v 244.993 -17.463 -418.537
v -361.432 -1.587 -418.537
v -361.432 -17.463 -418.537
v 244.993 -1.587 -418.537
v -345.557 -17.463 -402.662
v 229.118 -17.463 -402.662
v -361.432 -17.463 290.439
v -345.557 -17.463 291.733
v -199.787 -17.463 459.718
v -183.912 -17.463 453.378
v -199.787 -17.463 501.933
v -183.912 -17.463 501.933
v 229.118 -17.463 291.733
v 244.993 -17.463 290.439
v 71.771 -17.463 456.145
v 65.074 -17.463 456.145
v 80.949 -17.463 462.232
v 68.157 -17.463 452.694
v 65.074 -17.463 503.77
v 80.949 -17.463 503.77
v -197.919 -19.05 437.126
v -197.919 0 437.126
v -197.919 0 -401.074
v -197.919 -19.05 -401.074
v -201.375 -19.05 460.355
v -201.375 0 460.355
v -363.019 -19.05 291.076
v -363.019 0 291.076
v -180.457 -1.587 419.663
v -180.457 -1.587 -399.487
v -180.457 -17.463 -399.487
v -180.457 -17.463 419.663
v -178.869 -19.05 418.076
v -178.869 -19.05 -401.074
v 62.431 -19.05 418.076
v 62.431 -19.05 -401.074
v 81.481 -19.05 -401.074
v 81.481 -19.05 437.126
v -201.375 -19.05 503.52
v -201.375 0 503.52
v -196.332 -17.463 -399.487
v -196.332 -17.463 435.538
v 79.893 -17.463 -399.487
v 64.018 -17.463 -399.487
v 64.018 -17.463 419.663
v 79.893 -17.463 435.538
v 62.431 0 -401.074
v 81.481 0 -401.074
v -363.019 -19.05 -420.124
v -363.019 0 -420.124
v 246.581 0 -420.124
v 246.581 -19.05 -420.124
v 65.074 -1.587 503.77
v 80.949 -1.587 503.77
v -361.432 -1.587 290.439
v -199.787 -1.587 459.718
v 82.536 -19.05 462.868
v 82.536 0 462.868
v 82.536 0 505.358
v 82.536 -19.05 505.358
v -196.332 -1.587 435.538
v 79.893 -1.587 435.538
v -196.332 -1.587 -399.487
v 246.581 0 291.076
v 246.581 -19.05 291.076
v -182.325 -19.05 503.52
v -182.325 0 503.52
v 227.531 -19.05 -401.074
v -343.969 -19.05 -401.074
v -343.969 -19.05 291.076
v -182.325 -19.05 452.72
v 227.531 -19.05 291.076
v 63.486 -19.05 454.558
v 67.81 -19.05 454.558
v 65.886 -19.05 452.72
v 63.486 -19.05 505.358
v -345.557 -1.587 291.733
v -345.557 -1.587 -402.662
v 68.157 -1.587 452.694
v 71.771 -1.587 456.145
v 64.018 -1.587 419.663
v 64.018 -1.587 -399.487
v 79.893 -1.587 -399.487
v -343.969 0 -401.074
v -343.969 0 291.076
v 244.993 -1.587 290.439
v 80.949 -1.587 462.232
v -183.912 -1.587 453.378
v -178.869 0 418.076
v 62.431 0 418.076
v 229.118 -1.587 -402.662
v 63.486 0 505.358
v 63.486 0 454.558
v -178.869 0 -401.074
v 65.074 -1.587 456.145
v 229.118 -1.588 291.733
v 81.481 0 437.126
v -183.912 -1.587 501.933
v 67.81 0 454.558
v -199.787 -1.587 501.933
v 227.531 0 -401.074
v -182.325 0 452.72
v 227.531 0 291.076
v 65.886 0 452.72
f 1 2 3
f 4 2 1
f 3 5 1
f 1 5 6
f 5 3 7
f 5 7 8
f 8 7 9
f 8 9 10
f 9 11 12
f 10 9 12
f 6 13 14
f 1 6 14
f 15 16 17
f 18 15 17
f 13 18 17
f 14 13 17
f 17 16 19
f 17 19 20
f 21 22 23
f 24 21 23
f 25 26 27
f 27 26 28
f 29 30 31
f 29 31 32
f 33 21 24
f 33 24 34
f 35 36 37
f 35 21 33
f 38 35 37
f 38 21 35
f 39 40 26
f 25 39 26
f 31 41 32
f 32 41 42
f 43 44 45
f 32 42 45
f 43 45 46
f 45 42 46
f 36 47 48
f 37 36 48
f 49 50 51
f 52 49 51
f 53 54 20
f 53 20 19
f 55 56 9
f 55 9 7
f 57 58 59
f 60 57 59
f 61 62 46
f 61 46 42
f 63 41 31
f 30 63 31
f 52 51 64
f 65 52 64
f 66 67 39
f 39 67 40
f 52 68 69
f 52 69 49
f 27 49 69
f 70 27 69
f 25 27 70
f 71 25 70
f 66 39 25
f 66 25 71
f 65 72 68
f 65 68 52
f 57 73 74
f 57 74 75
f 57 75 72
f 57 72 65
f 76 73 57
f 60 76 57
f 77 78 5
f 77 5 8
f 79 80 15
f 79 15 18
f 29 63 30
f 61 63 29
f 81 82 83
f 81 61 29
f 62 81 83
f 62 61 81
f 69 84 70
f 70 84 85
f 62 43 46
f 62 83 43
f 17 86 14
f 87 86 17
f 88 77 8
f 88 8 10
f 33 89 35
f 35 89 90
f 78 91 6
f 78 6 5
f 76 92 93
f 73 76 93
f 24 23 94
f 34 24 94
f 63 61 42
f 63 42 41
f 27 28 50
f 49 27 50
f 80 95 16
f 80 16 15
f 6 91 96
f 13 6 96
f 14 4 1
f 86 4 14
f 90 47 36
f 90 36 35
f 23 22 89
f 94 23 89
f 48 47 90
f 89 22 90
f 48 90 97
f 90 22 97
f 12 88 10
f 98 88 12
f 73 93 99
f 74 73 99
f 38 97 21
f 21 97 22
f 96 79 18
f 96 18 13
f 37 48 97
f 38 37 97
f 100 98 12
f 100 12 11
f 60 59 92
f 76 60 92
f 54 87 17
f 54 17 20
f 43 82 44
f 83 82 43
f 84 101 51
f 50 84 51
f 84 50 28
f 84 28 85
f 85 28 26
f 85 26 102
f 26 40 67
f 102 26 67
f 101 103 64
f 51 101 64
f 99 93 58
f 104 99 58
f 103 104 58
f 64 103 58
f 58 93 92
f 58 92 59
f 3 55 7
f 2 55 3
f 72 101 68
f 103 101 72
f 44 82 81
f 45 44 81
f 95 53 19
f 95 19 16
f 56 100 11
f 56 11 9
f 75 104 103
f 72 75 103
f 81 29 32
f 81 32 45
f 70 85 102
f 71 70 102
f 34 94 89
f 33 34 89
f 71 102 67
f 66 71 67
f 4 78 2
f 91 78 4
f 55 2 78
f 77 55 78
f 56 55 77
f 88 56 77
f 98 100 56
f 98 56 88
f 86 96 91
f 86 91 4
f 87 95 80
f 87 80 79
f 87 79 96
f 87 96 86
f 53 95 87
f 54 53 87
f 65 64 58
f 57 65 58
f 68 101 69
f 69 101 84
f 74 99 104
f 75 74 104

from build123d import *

# Parameters (mm, degrees)
F0_W     = 19.05
F0_H     = 692.15
F1_DEPTH = 19.05
F2_W     = 19.05
F2_H     = 819.15
F3_DEPTH = 19.05
F4_T     = -1.5875


with BuildPart() as f1:
    # F0 (on Front) → F1 (new body)
    with BuildSketch(Plane.XZ):
        Polygon((-201.3746880207, 460.3546897234), (-363.0192981999, 291.0755020554), (-343.9692981999, 291.0755020554), (-182.3246880207, 452.7201122347), (-201.3746880207, 452.7201122347), align=None)
        Polygon((-343.9692981999, 291.0755020554), (-363.0192981999, 291.0755020554), (-363.0192981999, -420.1244979446), (-343.9692981999, -420.1244979446), (-343.9692981999, -401.0744979446), align=None)
        Polygon((-201.3746880207, 503.5201122347), (-201.3746880207, 460.3546897234), (-196.1021746691, 465.8762272256), (-182.3246880207, 452.7201122347), (-182.3246880207, 503.5201122347), align=None)
        Polygon((-196.1021746691, 465.8762272256), (-201.3746880207, 460.3546897234), (-201.3746880207, 452.7201122347), (-182.3246880207, 452.7201122347), align=None)
        Polygon((227.5307018001, -401.0744979446), (-343.9692981999, -401.0744979446), (-343.9692981999, -420.1244979446), (246.5807018001, -420.1244979446), (246.5807018001, -401.0744979446), align=None)
        with Locations((237.0557018001, -54.9994979446)):
            Rectangle(F0_W, F0_H)
        Polygon((65.8860916208, 452.7201122347), (227.5307018001, 291.0755020554), (246.5807018001, 291.0755020554), (82.5360768914, 462.8680586711), (82.5360768914, 454.5575380325), (67.8103002048, 454.5575380325), align=None)
        Polygon((82.5360768914, 454.5575380325), (82.5360768914, 462.8680586711), (79.6635782692, 465.8762272256), (67.8103002048, 454.5575380325), align=None)
        Polygon((79.6635782692, 465.8762272256), (82.5360768914, 462.8680586711), (82.5360768914, 505.3575380325), (63.4860768914, 505.3575380325), (63.4860768914, 454.5575380325), (67.8103002048, 454.5575380325), align=None)
    extrude(amount=F1_DEPTH)

    # F4 (hollow: no face is removed)
    offset(amount=F4_T, kind=Kind.INTERSECTION, mode=Mode.SUBTRACT)


with BuildPart() as f3:
    # F2 (on Front) → F3 (new body)
    with BuildSketch(Plane.XZ):
        Polygon((81.4807018001, 437.1255020554), (-197.9192981999, 437.1255020554), (-197.9192981999, 418.0755020554), (-178.8692981999, 418.0755020554), (62.4307018001, 418.0755020554), (81.4807018001, 418.0755020554), align=None)
        with Locations((-188.3942981999, 8.5005020554)):
            Rectangle(F2_W, F2_H)
        with Locations((71.9557018001, 8.5005020554)):
            Rectangle(F2_W, F2_H)
    extrude(amount=F3_DEPTH)

    # F4#2 (hollow: no face is removed)
    offset(amount=F4_T, kind=Kind.INTERSECTION, mode=Mode.SUBTRACT)


solid = Compound([f1.part, f3.part])
